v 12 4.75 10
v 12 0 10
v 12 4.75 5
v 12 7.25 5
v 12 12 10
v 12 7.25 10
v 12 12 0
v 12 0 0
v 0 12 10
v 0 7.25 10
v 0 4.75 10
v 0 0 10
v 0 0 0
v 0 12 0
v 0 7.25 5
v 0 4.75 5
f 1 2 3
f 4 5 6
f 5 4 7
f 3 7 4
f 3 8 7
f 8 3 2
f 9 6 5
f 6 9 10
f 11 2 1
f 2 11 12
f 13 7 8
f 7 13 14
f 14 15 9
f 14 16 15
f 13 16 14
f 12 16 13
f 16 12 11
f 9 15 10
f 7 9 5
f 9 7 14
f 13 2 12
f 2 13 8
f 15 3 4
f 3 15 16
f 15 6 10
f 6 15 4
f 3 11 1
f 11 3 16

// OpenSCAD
$fn = 32;

// ----------------------------------------------------------------------
// Micro clip: slotted block, 5-20 mm class
// ----------------------------------------------------------------------

// --- parameters (mm) ---
block_l = 12;             // block length, X
block_w = 12;             // block width, Y
block_h = 10;             // block height, Z
slot_w = 2.5;             // slot width
slot_d = 5;               // slot depth from the top

difference() {
  cube([block_l, block_w, block_h]);
  translate([-1, block_w / 2 - slot_w / 2, block_h - slot_d])
    cube([block_l + 2, slot_w, slot_d + 1]);
}
